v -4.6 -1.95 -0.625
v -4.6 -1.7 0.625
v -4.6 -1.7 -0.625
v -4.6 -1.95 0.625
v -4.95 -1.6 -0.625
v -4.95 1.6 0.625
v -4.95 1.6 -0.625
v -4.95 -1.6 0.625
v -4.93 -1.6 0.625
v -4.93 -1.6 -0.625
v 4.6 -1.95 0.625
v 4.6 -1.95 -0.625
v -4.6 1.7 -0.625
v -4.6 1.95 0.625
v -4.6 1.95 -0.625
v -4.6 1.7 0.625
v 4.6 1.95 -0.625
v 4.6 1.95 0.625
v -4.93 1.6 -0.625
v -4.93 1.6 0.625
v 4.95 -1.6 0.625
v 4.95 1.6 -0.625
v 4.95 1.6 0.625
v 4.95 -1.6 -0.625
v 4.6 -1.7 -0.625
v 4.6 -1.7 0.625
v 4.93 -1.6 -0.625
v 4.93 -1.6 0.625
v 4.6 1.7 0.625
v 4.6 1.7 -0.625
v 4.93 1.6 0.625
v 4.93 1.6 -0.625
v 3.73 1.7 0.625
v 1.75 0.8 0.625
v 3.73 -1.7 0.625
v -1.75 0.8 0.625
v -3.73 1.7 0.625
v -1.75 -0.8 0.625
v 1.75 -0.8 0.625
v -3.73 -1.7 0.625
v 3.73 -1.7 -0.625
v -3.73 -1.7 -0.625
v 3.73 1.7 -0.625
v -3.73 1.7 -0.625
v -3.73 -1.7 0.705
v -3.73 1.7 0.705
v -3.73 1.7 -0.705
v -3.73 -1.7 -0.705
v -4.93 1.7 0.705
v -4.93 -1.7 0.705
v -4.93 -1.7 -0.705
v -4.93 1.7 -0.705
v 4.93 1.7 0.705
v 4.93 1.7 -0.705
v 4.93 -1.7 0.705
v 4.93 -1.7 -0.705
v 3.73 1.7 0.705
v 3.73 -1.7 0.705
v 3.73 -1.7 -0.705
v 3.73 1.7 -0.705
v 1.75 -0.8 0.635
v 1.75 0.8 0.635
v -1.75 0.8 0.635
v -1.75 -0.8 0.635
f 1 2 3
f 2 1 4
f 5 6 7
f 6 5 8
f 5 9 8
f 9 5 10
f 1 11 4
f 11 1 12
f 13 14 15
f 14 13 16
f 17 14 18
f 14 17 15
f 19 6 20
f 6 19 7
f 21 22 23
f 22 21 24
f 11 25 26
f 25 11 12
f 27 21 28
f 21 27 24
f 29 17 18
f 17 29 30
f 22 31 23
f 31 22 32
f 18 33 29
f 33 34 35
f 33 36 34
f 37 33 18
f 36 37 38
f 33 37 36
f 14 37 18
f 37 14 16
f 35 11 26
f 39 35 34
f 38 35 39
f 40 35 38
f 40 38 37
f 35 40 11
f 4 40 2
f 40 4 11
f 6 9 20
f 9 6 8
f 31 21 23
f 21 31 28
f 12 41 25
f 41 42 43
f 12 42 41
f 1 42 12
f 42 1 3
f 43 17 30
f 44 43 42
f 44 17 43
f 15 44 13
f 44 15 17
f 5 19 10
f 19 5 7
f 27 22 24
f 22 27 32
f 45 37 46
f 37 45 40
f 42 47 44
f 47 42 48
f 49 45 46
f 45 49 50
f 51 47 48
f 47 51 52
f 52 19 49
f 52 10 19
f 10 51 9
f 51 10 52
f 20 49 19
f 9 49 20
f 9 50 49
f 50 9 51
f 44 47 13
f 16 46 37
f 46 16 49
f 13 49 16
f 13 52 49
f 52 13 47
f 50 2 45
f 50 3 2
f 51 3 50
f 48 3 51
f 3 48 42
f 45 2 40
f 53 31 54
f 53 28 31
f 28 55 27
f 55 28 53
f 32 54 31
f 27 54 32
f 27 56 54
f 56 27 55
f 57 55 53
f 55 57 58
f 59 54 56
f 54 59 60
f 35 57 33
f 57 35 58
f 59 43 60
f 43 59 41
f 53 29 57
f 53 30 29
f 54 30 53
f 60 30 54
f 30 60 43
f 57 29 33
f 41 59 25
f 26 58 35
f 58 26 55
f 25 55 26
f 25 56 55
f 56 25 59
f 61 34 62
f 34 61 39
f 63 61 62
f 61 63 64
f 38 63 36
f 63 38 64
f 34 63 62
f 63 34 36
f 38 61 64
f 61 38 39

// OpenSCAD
// SMD package: 9.90 x 3.90 x 1.25 (L x W x H) — one connected solid

$fn = 48;

// Parameters (mm)
body_length = 9.90;
body_width  = 3.90;
body_height = 1.25;

termination_length    = 1.20;
termination_thickness = 0.08;
termination_inset_y   = 0.25;

marking_length    = 3.50;
marking_width     = 1.60;
marking_thickness = 0.03;

chamfer_size = 0.35;

// Small overlap to guarantee watertight unions/differences
overlap = 0.02;

// Helpers
function clamp(v, lo, hi) = v < lo ? lo : (v > hi ? hi : v);

// Derived (keep sane)
term_w = clamp(body_width - 2*termination_inset_y, 0.01, body_width);
term_h = body_height + 2*termination_thickness;

// Base shapes
module smd_body() {
  cube([body_length, body_width, body_height], center=true);
}

module pin_termination(side=1) { // side = -1 (left), +1 (right)
  // Ensure termination overlaps into body by 'overlap' so it is connected
  translate([ side*(body_length/2 - termination_length/2 - overlap), 0, 0 ])
    cube([termination_length, term_w, term_h], center=true);
}

module top_marking() {
  // Ensure marking overlaps into body by 'overlap' so it is connected
  translate([0, 0, body_height/2 + marking_thickness/2 - overlap])
    cube([marking_length, marking_width, marking_thickness], center=true);
}

// Chamfer cutouts (subtract from body only, not from terminations)
module chamfer_cutouts() {
  cut_h = body_height + 2*overlap;

  for (sx = [-1, 1], sy = [-1, 1]) {
    translate([ sx*(body_length/2 - chamfer_size/2),
                sy*(body_width/2  - chamfer_size/2),
                0 ])
      cube([chamfer_size, chamfer_size, cut_h], center=true);
  }
}

// Final output: one connected solid
union() {
  // Body with chamfered corners
  difference() {
    smd_body();
    chamfer_cutouts();
  }

  // Terminations (symmetrical, connected with overlap)
  pin_termination(-1);
  pin_termination( 1);

  // Top marking (connected with overlap)
  top_marking();
}
